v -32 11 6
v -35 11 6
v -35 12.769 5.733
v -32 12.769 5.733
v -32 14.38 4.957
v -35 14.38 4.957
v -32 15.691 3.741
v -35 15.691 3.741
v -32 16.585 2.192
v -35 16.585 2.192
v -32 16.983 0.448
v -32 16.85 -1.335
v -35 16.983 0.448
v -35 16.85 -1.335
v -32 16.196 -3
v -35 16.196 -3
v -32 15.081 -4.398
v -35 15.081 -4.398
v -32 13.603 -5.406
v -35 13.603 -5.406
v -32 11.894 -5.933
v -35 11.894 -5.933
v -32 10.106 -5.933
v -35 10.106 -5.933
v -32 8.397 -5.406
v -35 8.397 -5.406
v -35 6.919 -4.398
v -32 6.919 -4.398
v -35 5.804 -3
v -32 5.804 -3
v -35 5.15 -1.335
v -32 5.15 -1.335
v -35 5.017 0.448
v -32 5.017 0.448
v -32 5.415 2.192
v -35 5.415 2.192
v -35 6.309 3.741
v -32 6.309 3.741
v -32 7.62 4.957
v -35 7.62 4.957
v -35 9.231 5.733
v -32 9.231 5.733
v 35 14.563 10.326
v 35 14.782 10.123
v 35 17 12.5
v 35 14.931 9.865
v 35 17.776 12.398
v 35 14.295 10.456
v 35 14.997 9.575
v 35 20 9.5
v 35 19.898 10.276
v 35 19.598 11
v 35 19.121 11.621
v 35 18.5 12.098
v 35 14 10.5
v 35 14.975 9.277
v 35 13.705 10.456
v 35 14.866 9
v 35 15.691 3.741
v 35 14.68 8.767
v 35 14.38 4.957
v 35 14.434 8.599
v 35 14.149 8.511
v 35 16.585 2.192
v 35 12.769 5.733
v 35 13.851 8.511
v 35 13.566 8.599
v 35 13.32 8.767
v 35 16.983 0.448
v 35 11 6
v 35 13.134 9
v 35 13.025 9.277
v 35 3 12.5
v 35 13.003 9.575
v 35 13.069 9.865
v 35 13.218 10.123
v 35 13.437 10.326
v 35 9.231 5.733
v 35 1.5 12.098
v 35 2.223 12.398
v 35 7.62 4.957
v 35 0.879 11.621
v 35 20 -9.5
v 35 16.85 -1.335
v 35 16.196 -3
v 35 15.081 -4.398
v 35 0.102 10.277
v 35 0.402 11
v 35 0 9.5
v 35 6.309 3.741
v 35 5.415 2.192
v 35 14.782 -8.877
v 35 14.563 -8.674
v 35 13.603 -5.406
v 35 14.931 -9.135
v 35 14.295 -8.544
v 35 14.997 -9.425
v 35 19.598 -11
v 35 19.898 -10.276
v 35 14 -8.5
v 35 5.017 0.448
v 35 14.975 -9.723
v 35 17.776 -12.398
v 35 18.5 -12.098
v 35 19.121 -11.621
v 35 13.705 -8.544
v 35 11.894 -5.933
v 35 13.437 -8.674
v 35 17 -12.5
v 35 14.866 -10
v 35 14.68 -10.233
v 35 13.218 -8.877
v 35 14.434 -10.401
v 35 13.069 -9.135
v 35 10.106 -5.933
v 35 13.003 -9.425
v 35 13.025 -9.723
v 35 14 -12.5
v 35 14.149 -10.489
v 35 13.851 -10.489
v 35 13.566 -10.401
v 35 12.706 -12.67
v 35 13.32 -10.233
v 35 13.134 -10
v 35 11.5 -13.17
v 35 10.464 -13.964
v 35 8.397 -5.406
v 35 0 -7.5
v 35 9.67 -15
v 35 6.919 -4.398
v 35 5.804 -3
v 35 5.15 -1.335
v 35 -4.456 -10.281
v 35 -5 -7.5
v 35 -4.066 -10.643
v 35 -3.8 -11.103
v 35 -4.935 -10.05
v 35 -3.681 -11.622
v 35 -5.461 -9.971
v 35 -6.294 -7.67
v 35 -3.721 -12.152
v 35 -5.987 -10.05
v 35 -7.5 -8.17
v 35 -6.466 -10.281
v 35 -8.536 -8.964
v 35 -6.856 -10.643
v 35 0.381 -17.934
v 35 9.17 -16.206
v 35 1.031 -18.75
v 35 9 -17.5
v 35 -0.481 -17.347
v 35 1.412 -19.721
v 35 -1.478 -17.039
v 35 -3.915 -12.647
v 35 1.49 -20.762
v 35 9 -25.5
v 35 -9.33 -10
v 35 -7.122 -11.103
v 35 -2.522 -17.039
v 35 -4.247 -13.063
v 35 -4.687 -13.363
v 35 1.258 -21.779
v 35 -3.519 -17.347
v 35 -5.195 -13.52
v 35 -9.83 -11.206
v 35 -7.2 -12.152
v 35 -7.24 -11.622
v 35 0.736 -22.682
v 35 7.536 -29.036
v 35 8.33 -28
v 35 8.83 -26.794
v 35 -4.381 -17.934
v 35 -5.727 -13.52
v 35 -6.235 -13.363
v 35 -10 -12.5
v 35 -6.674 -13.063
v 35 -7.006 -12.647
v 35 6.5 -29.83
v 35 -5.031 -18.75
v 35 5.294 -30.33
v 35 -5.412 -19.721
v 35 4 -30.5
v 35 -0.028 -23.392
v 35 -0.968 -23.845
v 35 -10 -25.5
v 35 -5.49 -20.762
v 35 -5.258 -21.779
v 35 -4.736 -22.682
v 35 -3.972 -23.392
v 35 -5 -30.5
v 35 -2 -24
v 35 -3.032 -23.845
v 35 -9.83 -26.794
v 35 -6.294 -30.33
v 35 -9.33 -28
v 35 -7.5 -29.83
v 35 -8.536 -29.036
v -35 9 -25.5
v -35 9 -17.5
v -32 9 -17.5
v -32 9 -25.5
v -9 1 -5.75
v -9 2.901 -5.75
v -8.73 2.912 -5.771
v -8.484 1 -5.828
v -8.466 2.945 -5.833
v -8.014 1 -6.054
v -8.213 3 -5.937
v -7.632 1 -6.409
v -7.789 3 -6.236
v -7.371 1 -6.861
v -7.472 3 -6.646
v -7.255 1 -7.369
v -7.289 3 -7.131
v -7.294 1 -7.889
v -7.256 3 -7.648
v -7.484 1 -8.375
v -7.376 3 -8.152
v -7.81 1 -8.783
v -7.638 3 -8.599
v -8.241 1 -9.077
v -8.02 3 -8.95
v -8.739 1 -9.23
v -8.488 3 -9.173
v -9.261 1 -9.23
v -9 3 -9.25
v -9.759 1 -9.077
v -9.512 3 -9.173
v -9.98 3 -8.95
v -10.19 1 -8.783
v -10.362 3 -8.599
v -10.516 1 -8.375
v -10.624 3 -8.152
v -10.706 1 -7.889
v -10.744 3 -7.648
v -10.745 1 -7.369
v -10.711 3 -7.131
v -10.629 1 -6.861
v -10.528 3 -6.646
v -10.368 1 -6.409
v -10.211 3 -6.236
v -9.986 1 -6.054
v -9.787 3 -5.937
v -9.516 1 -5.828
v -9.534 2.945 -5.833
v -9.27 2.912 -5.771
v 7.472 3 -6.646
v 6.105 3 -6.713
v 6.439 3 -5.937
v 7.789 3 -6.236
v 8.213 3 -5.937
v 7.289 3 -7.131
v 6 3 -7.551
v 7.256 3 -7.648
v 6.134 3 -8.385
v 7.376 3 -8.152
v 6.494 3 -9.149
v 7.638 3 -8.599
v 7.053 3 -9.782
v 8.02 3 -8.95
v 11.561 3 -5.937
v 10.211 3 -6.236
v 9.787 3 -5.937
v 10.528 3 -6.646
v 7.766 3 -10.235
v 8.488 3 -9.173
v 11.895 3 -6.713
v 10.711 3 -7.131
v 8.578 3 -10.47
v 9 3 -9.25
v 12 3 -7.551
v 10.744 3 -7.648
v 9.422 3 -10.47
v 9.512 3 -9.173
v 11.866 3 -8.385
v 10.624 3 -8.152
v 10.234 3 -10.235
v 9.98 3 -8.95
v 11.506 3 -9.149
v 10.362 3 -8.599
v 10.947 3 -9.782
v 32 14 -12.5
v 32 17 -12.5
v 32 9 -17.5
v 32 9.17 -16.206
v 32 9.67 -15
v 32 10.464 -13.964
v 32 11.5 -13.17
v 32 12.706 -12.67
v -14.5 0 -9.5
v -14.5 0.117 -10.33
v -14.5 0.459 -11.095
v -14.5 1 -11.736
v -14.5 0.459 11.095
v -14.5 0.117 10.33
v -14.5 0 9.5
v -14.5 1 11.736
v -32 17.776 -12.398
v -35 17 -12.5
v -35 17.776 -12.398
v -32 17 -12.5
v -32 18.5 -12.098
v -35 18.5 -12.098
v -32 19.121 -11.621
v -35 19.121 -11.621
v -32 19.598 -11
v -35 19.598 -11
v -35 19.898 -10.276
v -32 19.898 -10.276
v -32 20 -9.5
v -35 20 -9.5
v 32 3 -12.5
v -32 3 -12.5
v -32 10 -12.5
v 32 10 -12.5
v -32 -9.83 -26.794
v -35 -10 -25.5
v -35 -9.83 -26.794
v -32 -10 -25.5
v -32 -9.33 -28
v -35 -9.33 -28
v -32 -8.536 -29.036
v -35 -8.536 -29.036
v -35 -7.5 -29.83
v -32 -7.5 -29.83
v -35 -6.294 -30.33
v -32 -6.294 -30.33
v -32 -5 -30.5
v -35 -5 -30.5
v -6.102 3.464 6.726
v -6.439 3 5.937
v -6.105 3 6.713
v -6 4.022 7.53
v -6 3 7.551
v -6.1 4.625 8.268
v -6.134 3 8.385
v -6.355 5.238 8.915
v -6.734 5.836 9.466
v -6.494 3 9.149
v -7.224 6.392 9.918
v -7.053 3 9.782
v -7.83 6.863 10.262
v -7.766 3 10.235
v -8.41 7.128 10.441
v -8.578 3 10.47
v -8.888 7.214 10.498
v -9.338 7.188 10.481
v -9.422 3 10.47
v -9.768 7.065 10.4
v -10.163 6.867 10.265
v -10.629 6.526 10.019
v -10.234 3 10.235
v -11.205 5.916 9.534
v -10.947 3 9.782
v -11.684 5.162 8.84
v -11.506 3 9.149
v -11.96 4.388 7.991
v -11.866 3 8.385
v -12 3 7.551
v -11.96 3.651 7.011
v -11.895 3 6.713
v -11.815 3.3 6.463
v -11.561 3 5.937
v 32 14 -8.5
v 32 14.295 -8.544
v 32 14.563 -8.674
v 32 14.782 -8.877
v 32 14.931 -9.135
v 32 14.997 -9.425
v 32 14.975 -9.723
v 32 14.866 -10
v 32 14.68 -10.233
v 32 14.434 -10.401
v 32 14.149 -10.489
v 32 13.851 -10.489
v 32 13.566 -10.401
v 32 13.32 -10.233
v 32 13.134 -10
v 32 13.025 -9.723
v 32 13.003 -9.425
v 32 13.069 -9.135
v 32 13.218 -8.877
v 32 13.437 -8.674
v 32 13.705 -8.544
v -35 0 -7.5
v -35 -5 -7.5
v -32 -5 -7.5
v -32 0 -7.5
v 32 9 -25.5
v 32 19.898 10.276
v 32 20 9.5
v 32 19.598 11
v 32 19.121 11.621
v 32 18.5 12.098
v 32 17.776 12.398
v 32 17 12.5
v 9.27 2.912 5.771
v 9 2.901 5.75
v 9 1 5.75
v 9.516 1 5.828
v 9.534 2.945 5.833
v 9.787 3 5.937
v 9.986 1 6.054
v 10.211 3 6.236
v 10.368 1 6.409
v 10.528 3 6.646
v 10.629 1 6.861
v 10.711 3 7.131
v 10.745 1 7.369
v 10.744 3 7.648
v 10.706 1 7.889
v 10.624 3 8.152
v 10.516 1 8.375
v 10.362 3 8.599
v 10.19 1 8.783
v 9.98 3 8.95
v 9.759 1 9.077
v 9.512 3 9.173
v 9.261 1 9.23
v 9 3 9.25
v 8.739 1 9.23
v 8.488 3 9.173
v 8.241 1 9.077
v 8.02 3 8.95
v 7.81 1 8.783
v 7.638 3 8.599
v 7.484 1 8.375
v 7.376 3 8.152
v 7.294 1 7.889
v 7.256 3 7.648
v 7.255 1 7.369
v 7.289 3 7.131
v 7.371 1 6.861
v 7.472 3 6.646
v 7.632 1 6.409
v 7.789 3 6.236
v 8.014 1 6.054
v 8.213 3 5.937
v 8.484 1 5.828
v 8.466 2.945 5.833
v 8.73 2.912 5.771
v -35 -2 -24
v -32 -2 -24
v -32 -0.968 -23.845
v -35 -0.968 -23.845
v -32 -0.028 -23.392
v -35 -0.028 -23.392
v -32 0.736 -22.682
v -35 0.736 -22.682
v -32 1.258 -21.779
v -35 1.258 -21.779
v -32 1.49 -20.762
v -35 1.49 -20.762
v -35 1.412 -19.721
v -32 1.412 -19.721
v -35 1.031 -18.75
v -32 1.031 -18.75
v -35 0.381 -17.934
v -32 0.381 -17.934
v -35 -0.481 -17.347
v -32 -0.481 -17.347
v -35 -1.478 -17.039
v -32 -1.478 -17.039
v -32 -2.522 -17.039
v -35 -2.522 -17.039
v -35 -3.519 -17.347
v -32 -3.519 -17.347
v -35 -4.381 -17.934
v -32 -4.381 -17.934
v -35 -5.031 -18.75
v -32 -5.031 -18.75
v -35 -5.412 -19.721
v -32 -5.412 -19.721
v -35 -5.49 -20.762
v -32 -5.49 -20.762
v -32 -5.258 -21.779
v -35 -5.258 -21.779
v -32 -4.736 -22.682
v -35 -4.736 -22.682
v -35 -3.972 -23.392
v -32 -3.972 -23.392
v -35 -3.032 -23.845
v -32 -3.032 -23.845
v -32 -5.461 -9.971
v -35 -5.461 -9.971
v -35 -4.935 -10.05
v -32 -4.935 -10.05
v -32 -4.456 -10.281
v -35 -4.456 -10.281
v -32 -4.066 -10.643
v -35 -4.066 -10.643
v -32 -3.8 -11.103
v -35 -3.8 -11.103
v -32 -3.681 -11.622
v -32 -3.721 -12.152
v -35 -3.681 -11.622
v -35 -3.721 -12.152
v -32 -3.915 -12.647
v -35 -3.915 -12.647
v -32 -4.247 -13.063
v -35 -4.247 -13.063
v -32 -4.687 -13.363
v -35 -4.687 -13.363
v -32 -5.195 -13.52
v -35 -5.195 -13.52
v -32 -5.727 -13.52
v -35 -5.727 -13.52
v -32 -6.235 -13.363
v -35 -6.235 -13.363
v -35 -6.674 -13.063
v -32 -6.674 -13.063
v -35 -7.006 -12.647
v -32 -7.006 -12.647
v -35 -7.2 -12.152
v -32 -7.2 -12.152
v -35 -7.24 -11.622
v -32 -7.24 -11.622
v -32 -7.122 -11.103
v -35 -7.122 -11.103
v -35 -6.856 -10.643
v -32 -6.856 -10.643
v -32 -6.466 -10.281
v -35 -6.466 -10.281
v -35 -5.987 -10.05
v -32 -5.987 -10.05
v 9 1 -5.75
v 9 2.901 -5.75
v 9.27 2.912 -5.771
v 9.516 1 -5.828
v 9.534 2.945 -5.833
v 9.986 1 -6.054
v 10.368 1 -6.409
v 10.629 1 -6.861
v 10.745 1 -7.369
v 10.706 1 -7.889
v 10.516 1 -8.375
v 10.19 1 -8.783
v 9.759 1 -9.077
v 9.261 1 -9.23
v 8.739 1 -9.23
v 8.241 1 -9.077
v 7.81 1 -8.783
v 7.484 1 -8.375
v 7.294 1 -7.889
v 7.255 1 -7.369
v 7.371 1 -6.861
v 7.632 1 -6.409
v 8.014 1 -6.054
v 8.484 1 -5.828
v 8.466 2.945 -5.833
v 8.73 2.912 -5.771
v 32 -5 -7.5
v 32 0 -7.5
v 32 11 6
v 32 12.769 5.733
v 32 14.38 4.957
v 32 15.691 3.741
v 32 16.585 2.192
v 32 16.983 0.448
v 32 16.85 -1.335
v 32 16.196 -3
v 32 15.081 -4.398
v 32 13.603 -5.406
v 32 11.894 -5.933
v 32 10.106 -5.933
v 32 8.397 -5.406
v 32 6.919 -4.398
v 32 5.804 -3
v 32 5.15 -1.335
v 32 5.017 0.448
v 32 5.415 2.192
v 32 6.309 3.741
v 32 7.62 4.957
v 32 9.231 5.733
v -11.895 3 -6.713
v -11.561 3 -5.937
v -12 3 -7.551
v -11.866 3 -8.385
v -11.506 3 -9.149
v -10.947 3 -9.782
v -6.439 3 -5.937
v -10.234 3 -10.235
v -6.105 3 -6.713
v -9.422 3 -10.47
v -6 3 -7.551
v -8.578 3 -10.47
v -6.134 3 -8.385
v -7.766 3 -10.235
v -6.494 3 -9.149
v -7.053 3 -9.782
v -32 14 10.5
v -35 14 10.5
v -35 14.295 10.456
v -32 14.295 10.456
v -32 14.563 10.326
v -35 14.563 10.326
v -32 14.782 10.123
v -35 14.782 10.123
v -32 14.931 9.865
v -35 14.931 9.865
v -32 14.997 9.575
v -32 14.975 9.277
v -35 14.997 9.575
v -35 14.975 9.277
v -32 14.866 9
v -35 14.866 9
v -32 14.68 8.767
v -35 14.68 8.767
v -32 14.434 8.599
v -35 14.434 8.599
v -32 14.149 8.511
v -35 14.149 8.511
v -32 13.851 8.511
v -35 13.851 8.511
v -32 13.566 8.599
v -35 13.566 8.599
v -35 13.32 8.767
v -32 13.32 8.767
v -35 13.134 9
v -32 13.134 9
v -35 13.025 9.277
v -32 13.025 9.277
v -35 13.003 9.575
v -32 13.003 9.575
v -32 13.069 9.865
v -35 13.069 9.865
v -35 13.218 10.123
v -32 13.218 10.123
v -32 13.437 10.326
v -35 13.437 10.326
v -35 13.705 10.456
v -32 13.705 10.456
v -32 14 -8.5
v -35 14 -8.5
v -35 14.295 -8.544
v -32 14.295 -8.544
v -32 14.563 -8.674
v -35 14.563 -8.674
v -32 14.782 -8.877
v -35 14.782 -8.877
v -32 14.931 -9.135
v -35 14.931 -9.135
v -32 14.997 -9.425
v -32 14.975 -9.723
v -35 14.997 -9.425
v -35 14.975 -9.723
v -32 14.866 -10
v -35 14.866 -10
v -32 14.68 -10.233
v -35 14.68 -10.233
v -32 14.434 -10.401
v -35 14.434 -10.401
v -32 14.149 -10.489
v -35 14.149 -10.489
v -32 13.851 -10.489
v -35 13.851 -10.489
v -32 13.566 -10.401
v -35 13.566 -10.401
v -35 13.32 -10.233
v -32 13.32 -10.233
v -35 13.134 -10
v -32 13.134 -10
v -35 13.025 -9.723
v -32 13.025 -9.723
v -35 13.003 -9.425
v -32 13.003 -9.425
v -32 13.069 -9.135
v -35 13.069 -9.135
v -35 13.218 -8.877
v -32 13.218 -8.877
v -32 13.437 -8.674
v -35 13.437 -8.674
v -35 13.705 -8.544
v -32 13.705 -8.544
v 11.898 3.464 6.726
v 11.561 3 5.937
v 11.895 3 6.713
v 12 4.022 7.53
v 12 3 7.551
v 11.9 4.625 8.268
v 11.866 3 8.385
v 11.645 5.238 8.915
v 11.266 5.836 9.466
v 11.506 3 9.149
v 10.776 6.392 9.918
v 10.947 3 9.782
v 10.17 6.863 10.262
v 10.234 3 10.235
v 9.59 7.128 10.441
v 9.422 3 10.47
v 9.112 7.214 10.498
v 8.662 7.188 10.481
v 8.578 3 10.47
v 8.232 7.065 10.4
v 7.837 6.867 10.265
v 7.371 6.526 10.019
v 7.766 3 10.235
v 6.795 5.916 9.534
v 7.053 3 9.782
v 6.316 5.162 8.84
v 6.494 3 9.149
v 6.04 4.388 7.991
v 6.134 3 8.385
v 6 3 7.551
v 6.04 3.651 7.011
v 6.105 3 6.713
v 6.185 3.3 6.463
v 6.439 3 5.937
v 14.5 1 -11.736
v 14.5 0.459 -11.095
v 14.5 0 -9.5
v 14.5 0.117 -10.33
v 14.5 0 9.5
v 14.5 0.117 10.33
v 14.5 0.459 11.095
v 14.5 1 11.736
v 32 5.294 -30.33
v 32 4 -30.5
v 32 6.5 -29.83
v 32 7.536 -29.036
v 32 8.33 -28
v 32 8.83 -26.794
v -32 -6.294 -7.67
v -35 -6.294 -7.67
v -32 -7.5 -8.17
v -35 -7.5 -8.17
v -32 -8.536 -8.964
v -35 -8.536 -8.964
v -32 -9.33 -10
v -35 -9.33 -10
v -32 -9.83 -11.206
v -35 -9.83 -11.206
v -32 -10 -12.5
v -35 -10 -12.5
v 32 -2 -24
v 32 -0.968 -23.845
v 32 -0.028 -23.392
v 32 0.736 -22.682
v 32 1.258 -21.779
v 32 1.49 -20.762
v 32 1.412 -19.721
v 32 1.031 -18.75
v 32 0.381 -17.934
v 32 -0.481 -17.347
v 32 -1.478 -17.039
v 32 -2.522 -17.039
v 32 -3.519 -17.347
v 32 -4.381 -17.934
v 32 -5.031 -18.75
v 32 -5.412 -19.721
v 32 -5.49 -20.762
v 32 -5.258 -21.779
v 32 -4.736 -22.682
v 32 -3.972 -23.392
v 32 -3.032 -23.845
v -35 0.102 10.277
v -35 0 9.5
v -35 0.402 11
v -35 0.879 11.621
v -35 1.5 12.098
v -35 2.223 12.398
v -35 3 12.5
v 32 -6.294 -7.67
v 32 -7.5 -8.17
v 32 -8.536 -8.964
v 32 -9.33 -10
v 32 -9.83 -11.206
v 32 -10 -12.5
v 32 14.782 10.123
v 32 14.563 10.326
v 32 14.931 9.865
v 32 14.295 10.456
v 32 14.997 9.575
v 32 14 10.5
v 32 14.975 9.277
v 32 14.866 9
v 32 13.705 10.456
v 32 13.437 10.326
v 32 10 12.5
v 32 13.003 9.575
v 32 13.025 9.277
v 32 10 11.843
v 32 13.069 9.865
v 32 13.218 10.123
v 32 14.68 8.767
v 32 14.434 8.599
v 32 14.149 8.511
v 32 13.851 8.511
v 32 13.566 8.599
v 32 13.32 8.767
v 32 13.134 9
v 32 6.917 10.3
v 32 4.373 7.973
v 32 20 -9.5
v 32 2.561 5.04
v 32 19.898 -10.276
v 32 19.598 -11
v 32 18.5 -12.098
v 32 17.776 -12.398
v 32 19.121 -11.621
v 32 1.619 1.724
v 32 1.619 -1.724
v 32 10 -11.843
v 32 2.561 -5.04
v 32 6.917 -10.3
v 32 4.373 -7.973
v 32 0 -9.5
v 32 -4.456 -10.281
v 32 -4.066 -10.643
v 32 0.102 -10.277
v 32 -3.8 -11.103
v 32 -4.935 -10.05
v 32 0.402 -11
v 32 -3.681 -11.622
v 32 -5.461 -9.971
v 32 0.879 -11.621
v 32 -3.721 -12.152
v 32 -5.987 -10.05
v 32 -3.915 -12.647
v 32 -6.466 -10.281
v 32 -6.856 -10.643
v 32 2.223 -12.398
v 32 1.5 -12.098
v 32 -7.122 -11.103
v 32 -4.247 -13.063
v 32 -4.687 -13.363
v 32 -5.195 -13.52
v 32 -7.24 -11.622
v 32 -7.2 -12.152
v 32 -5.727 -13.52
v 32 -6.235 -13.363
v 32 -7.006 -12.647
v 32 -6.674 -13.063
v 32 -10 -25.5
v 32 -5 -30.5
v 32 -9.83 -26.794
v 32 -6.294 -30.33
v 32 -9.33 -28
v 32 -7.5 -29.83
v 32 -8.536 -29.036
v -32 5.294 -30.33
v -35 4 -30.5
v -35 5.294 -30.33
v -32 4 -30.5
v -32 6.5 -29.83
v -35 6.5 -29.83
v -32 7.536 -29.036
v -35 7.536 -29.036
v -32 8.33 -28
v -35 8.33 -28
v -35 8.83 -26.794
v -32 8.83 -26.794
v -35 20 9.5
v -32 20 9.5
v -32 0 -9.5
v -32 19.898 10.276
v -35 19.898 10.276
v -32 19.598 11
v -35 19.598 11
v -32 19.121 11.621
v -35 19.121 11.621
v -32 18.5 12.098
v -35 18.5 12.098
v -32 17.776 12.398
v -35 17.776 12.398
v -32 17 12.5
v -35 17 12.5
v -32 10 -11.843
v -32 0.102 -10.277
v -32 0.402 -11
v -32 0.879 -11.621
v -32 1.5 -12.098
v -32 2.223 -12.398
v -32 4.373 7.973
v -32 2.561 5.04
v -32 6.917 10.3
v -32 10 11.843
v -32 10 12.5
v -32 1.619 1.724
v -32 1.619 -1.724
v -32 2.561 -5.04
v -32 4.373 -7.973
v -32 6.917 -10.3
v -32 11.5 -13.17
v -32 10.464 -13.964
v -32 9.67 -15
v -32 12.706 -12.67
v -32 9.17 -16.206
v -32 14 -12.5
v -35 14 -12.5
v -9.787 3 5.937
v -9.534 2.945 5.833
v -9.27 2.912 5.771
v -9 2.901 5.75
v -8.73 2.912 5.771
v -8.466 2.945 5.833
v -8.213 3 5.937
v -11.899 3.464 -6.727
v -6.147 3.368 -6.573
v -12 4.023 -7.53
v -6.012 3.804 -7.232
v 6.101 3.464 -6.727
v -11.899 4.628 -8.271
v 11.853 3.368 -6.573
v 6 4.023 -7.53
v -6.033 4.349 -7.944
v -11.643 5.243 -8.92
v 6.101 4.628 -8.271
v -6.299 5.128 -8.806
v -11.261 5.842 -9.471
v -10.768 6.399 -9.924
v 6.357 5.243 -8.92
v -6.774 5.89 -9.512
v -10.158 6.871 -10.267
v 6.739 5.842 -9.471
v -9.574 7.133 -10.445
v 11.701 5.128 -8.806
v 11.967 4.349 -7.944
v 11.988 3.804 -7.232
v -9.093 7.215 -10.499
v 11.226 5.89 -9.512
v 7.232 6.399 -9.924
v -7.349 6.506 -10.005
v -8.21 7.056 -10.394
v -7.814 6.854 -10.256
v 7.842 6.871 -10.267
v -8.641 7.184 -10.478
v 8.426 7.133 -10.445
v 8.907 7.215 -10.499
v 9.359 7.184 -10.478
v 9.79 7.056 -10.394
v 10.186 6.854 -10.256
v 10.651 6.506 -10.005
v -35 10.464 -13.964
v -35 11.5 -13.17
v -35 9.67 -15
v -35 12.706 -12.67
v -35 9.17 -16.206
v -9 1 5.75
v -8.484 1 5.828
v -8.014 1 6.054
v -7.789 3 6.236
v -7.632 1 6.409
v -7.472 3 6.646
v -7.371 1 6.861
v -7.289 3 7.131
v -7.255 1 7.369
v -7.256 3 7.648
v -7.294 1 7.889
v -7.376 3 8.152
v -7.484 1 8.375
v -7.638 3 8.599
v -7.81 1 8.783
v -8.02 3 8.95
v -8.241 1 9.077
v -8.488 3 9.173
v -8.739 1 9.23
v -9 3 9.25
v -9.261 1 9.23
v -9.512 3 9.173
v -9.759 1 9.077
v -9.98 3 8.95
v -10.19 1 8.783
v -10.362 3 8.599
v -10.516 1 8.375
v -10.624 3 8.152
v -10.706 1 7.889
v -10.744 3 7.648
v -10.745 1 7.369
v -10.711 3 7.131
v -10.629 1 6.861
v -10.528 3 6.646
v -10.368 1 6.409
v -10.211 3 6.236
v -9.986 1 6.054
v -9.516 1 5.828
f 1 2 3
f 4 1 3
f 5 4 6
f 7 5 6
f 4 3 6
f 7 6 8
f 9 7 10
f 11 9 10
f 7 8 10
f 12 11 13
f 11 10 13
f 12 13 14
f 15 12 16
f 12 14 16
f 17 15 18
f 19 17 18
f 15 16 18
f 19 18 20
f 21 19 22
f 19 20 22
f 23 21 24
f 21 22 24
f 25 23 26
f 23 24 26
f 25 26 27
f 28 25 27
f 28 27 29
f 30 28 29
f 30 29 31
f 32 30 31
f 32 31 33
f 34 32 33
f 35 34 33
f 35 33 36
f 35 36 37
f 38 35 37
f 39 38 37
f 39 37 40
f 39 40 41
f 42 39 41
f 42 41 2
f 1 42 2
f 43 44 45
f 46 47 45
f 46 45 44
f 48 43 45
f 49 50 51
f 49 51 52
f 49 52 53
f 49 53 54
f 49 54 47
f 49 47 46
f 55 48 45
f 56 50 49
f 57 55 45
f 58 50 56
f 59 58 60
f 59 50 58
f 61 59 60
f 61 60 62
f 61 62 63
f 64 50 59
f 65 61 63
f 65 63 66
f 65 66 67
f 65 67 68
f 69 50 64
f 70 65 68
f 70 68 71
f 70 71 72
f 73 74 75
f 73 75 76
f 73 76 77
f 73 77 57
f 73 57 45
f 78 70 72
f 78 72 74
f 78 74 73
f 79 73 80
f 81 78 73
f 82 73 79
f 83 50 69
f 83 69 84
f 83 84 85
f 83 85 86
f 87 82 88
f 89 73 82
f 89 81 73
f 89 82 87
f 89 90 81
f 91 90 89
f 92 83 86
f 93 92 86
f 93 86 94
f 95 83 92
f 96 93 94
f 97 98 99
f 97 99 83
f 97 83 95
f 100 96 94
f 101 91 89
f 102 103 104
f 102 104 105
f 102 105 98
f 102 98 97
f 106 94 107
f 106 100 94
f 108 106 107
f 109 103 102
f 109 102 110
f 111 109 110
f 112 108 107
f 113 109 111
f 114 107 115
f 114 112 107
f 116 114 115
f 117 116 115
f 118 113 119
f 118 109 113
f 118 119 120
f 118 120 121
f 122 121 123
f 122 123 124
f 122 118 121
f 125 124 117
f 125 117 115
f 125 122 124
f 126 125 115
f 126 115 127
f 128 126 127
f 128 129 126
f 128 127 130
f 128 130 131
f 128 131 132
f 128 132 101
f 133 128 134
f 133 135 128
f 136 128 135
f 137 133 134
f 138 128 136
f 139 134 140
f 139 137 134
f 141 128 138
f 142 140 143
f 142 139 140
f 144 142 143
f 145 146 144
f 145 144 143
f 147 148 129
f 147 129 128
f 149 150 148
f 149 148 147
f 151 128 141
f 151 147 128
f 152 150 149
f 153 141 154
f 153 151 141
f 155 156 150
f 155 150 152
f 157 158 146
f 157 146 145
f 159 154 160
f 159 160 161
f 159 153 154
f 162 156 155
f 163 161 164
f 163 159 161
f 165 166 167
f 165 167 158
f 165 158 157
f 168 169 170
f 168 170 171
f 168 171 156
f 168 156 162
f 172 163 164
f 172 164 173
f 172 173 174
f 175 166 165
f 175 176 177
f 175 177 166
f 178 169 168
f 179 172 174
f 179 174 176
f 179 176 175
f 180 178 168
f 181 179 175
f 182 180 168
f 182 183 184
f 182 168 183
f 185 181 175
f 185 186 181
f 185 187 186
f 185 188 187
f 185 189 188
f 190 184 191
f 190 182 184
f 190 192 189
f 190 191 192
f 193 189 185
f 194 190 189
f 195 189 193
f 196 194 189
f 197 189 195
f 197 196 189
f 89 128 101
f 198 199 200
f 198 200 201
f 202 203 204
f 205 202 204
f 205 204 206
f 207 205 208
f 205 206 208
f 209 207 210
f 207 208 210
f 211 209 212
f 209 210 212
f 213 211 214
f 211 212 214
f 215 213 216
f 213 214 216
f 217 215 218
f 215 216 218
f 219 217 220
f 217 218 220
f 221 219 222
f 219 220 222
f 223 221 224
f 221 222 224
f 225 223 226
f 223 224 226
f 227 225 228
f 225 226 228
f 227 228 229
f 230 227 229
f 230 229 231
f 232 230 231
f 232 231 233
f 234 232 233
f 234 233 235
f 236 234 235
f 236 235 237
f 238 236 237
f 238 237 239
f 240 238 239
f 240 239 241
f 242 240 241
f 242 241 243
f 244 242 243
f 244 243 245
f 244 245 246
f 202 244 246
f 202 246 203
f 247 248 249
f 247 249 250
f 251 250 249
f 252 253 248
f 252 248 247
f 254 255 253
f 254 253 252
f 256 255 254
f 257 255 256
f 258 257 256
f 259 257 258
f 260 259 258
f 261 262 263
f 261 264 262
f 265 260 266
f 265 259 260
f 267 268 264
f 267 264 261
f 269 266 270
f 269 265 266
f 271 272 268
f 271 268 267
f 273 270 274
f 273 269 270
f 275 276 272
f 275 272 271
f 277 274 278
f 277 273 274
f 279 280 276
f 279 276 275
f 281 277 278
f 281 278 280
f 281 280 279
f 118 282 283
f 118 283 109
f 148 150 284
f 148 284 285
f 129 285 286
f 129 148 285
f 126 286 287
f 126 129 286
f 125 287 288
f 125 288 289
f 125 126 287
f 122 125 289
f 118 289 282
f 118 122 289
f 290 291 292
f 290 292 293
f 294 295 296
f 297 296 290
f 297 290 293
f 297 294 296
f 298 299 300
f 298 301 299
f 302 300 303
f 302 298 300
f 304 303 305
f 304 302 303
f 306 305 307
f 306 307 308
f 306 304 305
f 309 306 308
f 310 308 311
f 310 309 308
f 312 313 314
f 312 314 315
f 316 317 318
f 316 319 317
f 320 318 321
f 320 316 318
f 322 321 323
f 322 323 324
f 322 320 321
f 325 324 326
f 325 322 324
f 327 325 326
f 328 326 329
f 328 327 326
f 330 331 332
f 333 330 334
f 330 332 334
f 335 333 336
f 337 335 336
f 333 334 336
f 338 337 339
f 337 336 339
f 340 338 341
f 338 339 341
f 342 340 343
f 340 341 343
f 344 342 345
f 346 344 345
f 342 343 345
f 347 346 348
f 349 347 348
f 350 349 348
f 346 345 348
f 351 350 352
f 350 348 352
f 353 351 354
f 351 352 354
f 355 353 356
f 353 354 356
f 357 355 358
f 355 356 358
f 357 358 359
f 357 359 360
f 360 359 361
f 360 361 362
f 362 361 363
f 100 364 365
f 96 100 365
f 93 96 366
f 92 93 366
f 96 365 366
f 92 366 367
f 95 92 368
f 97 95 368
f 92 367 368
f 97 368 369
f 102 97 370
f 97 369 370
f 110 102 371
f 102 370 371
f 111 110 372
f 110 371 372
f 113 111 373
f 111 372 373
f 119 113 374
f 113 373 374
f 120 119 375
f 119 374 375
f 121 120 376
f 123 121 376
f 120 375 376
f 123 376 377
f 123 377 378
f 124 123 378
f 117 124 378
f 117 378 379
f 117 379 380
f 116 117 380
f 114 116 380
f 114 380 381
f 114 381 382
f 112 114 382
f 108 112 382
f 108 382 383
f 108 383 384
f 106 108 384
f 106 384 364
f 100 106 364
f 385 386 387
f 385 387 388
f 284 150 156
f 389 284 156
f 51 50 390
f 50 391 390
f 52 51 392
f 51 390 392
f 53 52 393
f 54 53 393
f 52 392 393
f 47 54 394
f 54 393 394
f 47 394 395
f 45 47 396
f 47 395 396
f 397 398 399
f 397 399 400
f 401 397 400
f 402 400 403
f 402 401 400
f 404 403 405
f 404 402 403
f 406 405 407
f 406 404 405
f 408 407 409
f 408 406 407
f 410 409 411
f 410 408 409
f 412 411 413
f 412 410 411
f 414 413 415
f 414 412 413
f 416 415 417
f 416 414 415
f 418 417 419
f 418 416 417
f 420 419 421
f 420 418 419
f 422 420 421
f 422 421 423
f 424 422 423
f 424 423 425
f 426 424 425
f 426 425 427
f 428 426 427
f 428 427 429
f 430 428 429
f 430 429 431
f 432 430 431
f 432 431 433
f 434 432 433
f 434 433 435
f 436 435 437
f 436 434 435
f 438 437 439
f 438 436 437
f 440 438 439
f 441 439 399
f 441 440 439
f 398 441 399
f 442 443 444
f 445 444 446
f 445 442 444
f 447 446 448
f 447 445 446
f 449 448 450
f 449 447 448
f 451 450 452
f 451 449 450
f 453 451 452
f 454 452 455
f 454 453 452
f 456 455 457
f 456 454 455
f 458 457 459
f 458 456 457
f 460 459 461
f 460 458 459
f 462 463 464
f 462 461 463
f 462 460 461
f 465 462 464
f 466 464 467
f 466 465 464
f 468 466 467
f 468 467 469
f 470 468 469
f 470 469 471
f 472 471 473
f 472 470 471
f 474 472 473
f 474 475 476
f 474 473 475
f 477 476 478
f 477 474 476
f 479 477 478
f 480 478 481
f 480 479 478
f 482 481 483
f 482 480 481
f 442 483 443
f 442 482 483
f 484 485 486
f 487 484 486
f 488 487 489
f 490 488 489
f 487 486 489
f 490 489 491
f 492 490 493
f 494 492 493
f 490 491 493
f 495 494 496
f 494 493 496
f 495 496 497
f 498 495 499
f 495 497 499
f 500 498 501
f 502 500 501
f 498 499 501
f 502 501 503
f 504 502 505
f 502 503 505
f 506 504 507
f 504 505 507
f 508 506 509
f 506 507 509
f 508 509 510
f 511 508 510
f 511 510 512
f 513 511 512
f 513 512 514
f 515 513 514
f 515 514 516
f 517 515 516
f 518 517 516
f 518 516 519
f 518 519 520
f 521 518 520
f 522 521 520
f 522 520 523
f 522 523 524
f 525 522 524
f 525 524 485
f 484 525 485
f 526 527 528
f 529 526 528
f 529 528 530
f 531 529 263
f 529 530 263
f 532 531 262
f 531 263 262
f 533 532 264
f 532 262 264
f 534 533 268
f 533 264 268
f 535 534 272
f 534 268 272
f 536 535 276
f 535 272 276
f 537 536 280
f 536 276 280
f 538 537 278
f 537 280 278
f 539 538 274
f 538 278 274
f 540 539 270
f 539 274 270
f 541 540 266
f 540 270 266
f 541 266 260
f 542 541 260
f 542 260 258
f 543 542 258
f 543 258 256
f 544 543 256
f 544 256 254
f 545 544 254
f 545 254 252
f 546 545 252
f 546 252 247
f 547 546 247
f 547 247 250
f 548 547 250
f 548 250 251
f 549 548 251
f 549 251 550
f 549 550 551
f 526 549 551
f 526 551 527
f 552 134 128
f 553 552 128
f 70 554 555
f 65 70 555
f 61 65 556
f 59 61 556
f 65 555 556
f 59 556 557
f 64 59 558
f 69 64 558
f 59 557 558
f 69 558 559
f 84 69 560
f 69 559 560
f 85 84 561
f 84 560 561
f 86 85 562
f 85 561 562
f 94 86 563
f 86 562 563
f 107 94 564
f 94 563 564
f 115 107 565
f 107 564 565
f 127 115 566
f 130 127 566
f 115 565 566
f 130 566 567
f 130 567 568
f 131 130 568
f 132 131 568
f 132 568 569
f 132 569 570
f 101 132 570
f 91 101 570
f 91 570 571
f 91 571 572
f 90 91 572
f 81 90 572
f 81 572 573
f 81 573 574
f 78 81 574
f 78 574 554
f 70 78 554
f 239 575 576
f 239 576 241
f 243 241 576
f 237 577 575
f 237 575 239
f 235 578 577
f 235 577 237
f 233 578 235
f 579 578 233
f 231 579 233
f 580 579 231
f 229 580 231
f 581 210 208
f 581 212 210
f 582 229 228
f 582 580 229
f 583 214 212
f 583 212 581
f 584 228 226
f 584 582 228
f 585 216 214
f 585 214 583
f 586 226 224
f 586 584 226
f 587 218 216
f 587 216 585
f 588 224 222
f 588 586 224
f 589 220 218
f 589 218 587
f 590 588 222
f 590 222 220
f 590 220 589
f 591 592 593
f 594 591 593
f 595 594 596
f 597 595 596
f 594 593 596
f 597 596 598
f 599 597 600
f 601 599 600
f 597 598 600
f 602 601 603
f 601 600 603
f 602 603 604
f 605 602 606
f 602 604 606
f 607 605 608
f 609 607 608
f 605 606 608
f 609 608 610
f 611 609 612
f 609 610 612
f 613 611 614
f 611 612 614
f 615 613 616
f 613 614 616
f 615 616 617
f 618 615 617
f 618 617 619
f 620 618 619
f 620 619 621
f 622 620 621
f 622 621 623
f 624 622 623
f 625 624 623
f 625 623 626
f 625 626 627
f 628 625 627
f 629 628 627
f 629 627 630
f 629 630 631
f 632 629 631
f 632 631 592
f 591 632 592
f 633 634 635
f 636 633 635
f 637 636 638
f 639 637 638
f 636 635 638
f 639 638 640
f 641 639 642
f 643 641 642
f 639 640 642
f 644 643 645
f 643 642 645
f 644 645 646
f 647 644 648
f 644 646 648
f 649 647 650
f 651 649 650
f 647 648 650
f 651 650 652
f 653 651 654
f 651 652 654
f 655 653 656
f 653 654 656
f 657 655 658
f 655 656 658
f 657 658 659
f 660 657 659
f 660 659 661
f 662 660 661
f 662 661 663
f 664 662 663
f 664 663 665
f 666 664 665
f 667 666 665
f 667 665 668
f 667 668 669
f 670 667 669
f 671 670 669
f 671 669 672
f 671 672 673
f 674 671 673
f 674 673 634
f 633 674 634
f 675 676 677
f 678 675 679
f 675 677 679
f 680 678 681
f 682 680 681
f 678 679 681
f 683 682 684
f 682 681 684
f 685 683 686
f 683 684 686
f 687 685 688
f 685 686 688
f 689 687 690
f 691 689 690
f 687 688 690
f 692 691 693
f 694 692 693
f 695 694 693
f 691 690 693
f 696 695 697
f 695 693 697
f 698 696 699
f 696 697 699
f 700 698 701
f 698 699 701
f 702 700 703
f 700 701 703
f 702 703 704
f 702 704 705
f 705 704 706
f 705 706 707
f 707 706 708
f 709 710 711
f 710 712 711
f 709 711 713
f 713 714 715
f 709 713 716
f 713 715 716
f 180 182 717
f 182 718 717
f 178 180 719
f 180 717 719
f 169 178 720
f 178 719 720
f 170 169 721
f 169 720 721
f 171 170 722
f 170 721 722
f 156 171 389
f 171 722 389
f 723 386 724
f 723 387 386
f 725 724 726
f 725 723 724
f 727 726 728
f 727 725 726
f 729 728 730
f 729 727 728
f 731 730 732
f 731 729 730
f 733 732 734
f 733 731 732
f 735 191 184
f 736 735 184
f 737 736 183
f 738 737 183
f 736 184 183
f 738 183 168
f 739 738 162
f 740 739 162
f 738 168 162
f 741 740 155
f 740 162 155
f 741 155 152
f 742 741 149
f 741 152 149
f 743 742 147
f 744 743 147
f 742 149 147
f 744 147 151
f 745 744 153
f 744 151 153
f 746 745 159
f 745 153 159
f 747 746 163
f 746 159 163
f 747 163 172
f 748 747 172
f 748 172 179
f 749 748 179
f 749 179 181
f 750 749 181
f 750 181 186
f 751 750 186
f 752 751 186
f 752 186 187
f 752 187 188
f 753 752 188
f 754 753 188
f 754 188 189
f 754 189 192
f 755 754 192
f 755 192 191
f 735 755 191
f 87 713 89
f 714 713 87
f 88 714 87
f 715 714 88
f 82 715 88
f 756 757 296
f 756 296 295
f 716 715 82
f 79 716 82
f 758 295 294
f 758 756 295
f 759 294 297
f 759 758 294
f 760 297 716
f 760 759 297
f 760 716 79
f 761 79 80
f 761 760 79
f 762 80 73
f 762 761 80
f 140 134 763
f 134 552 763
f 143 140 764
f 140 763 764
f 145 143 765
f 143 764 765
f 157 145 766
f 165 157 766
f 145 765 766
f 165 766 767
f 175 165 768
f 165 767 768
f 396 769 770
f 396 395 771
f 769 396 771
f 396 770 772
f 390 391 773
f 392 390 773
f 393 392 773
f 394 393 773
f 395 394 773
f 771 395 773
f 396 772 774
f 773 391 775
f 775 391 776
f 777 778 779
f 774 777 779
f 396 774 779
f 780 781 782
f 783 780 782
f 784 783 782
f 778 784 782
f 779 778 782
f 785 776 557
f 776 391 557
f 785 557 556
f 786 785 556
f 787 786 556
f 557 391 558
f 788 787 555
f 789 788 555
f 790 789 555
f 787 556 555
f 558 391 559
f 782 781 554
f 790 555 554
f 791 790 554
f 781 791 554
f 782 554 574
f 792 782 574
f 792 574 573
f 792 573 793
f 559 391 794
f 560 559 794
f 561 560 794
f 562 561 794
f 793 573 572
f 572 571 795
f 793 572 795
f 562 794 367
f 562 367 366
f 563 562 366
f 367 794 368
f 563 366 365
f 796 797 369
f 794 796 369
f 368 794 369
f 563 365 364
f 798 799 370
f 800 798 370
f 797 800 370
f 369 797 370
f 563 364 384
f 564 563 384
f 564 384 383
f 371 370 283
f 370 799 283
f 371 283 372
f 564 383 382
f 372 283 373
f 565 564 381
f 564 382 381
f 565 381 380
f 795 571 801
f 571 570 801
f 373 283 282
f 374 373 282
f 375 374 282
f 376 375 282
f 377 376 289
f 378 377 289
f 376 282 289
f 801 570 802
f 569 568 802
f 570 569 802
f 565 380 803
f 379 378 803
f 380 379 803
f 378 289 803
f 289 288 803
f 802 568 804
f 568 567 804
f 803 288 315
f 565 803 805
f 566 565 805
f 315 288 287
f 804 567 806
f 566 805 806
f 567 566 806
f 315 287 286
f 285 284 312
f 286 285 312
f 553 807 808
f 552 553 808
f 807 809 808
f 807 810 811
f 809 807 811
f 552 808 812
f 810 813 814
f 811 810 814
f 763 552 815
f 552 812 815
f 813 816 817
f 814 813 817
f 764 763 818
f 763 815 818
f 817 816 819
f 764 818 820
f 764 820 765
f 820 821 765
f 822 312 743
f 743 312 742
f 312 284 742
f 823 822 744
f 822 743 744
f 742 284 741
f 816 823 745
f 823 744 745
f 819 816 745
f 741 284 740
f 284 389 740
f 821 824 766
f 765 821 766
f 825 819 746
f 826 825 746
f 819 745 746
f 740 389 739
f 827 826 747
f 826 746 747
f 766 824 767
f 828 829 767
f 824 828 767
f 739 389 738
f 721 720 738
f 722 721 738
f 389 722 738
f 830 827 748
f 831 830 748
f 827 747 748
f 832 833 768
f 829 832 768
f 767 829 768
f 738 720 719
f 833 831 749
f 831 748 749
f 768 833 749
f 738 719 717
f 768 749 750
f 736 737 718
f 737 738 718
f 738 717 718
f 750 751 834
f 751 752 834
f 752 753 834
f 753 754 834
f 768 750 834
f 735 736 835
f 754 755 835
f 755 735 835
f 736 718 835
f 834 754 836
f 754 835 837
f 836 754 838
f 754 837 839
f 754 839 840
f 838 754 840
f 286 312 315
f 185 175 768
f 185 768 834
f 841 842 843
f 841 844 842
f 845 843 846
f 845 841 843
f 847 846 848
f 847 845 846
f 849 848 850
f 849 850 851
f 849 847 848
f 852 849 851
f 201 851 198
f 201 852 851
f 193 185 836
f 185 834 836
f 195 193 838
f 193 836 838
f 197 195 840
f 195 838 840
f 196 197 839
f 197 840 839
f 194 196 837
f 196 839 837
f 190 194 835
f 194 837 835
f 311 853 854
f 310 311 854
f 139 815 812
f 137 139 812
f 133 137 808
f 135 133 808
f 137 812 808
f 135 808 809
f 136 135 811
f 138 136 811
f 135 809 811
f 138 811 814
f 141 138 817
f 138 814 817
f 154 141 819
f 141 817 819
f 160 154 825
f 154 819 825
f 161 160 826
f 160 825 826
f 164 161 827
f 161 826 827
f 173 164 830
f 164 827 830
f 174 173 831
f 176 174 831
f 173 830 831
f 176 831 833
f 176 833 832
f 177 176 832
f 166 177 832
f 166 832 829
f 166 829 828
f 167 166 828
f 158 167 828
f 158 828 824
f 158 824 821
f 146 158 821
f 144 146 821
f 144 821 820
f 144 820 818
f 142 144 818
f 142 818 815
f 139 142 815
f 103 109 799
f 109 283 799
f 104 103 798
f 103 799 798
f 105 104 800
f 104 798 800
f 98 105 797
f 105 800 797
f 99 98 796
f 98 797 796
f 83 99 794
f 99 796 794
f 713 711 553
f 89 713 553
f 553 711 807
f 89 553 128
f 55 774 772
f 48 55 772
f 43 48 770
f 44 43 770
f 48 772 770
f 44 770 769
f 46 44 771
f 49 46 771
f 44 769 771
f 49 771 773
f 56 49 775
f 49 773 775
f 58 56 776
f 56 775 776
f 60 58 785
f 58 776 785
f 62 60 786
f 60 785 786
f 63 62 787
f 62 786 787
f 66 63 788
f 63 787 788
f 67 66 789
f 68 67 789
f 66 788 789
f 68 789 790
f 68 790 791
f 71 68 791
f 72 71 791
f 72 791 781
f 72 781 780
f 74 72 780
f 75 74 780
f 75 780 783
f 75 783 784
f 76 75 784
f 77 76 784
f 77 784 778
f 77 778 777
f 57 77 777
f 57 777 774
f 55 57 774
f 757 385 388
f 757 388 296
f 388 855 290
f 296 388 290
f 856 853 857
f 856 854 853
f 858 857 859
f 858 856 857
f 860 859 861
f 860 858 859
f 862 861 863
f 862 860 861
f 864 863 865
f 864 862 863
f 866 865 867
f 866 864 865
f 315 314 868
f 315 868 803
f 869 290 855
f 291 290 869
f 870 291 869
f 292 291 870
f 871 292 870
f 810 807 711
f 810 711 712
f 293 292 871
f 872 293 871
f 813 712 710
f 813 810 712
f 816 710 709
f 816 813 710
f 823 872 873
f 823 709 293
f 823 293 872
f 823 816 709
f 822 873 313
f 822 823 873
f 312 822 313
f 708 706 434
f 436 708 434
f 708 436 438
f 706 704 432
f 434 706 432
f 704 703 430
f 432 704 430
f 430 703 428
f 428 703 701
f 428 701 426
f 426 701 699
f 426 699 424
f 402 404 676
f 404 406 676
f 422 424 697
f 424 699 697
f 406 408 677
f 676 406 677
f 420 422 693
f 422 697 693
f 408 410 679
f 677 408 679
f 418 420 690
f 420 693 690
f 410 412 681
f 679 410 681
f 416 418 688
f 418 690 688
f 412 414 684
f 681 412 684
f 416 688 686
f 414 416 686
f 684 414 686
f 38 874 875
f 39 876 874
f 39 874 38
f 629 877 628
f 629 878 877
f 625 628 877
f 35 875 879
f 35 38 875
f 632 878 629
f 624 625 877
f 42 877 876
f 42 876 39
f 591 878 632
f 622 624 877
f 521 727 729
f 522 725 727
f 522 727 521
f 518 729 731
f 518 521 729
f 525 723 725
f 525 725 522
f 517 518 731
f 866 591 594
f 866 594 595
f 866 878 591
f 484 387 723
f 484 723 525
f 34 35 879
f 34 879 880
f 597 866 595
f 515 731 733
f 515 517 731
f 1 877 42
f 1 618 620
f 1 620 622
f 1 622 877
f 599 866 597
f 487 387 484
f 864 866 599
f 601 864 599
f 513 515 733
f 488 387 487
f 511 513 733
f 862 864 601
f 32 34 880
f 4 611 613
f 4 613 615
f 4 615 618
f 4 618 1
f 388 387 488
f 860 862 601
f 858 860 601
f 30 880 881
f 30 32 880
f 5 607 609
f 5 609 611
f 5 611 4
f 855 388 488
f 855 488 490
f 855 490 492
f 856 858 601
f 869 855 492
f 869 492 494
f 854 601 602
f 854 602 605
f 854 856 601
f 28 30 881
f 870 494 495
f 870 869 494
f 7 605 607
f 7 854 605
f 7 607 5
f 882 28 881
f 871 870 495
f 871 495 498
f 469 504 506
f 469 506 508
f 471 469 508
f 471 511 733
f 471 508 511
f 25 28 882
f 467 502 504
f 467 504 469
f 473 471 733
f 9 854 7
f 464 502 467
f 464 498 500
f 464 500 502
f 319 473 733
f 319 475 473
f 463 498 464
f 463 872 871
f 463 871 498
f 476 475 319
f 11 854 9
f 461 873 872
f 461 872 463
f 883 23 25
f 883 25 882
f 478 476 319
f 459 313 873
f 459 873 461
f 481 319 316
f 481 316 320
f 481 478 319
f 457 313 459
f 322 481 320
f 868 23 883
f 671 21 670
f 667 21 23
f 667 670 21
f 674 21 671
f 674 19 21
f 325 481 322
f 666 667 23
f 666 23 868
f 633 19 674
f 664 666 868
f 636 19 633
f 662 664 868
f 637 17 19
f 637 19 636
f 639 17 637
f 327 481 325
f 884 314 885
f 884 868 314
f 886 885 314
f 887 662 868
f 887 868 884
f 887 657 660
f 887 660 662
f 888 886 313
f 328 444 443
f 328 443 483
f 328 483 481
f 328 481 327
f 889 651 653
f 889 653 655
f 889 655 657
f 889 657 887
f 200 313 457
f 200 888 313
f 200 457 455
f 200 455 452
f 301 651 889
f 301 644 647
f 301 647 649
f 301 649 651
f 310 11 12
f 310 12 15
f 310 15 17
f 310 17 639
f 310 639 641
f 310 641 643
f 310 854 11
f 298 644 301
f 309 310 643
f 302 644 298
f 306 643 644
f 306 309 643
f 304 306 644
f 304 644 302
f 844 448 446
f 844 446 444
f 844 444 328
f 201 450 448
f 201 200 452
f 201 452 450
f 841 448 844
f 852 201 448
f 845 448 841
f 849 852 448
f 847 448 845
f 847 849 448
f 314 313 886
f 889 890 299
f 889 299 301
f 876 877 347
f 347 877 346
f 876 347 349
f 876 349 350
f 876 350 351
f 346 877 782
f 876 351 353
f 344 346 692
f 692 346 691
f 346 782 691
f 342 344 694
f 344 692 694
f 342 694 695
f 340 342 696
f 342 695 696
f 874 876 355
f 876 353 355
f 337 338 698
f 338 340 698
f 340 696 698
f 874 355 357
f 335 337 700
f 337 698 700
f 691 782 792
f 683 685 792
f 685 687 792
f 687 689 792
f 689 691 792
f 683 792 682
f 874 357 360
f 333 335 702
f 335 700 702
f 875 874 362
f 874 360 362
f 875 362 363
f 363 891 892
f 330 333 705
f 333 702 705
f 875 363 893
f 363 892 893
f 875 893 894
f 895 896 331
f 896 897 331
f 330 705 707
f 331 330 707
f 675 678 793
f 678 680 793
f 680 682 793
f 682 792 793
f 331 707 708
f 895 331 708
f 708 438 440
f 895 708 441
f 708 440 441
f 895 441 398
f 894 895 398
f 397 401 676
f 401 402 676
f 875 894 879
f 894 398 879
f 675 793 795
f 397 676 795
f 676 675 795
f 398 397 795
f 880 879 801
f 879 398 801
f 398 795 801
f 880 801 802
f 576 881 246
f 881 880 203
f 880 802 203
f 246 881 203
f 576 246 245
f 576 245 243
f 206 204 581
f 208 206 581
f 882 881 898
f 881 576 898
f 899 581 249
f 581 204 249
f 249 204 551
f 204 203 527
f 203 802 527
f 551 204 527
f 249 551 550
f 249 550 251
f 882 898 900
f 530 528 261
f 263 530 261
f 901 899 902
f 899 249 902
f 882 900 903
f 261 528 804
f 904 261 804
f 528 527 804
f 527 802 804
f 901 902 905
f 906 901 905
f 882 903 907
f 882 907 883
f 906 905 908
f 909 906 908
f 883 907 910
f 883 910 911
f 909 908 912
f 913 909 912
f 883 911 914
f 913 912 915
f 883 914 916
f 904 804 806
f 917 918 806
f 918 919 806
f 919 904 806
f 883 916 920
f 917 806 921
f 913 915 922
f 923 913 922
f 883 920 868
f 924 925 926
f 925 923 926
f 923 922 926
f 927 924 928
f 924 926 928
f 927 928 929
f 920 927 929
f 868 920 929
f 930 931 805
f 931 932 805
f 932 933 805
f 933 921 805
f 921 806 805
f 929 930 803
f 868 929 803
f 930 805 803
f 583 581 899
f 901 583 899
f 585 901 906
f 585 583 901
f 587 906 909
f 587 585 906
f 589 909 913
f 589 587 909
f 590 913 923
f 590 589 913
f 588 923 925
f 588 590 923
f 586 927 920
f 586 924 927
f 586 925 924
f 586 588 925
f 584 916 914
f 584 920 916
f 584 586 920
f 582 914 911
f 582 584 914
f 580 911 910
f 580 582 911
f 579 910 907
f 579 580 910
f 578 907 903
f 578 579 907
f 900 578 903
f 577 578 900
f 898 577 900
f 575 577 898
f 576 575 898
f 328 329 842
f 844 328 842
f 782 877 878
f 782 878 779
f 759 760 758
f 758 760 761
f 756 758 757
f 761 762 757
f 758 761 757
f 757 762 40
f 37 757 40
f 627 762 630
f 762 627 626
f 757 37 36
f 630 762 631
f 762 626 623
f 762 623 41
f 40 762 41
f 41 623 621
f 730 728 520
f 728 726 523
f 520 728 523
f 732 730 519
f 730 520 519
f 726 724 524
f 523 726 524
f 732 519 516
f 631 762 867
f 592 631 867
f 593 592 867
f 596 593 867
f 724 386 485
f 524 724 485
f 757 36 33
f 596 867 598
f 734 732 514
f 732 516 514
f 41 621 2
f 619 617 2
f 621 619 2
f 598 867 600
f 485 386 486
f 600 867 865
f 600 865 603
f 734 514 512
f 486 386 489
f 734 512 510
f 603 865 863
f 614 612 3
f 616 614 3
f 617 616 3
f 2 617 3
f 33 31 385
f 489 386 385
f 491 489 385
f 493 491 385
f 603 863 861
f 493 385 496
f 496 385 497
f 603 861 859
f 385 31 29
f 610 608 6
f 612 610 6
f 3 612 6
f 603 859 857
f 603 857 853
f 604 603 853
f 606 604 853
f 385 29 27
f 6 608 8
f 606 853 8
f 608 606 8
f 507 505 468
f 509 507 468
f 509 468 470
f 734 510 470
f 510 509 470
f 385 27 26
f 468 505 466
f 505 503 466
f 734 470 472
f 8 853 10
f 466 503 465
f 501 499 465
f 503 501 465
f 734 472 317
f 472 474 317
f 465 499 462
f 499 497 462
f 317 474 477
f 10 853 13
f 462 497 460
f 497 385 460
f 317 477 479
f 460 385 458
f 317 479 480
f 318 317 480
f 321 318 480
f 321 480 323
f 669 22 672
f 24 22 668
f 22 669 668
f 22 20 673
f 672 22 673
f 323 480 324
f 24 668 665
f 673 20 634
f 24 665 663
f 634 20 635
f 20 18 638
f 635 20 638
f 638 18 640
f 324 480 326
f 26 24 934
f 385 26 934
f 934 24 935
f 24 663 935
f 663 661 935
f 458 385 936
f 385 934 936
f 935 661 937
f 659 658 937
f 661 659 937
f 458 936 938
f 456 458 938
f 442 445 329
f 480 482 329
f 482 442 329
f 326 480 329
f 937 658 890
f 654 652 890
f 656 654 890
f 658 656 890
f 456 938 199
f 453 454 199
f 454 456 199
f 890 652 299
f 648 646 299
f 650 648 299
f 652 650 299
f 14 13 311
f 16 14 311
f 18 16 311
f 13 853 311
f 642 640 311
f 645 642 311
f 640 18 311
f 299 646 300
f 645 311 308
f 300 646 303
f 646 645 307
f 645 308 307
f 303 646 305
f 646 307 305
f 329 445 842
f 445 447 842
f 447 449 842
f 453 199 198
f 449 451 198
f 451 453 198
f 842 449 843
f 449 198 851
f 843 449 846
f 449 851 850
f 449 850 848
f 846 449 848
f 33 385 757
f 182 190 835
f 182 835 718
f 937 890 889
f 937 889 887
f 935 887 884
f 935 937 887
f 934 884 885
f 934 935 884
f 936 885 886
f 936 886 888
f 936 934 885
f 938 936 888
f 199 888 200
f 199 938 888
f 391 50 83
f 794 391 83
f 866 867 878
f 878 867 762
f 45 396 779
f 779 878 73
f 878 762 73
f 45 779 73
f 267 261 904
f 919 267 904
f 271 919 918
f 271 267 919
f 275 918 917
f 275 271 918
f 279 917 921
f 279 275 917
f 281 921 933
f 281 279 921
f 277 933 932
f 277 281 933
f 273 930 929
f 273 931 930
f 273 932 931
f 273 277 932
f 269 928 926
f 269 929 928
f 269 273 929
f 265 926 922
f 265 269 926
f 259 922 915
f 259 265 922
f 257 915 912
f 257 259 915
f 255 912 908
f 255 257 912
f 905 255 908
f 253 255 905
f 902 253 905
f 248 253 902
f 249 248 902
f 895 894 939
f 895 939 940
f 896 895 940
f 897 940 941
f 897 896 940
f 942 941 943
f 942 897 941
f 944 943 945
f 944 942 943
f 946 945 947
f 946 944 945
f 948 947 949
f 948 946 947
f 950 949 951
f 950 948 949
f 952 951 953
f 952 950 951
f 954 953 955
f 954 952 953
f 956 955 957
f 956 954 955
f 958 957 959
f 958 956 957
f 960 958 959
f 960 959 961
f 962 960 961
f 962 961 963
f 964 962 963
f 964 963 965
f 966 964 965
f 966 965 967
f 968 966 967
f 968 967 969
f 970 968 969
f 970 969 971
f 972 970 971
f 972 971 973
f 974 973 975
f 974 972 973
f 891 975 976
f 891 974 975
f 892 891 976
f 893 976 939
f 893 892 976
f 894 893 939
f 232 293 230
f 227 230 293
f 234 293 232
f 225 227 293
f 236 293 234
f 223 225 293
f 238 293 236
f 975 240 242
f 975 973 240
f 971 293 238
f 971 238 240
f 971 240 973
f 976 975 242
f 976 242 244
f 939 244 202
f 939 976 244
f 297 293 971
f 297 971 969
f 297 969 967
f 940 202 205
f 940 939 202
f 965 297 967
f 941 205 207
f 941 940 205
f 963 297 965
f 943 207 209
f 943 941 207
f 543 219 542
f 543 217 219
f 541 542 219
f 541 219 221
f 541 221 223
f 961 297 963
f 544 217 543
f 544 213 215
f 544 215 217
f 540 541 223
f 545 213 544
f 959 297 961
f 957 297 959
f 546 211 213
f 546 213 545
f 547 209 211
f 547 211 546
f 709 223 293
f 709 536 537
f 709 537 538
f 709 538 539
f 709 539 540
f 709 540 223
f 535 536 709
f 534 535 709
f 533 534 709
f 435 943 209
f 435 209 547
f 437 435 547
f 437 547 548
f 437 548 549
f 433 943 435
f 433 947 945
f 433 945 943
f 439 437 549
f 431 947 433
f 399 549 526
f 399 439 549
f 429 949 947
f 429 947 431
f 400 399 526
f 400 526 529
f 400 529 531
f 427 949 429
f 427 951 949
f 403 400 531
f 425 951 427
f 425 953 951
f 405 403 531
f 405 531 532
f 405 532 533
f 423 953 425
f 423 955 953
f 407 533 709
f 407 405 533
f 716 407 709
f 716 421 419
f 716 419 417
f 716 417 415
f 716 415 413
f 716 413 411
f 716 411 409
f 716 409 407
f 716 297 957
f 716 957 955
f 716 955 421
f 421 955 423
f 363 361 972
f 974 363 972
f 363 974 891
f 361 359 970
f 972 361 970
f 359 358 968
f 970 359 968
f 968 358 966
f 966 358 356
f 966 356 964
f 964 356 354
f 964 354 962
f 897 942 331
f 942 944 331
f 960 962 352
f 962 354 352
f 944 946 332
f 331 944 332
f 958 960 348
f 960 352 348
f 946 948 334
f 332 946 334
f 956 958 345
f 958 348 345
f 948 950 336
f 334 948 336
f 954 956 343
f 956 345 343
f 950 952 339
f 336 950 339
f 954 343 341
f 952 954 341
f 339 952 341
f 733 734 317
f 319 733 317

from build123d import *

# Parameters (mm, degrees)
SKETCH1_W            = 70
SKETCH1_H            = 25
BOSS_EXTRUDE1_DEPTH  = 10
SKETCH2_W            = 3
SKETCH2_H            = 25
BOSS_EXTRUDE2_DEPTH  = 10
SKETCH3_R            = 12.5
CUT_EXTRUDE1_DEPTH   = 67
SKETCH4_R            = 3
CUT_EXTRUDE2_DEPTH   = 41.868692174
SKETCH5_R            = 1.75
CUT_EXTRUDE3_DEPTH   = 41.868692259
SKETCH6_W            = 29
SKETCH6_H            = 13
CUT_EXTRUDE4_DEPTH   = 1
SKETCH9_W            = 25
SKETCH9_H            = 20
BOSS_EXTRUDE3_DEPTH  = 3
SKETCH8_R            = 6
SKETCH8_R_2          = 1
CUT_EXTRUDE6_DEPTH   = 74.866433513
FILLET1_R            = 3
SKETCH10_W           = 23
SKETCH10_H           = 19
BOSS_EXTRUDE4_DEPTH  = 3
FILLET2_R            = 5
SKETCH11_R           = 3.5
CUT_EXTRUDE7_DEPTH   = 79.931932702
FILLET2_OF_MIRROR2_R = 5
FILLET3_R            = 5
FILLET4_R            = 3
SKETCH12_R           = 1.784400781
CUT_EXTRUDE8_DEPTH   = 79.931932702


# Some blends are built 0.0001 mm under size
with BuildPart() as part:
    # Sketch1 → Boss-Extrude1 (new body)
    with BuildSketch(Plane(origin=(0, 0, 0), x_dir=(1, 0, 0), z_dir=(0, 1, 0))):
        Rectangle(SKETCH1_W, SKETCH1_H)
    extrude(amount=BOSS_EXTRUDE1_DEPTH)

    # Sketch2 → Boss-Extrude2 (add)
    with BuildSketch(Plane(origin=(0, 10, 0), x_dir=(1, 0, 0), z_dir=(0, 1, 0))):
        with Locations((-33.5, 0)):
            Rectangle(SKETCH2_W, SKETCH2_H)
    extrude(amount=BOSS_EXTRUDE2_DEPTH)

    # Sketch3 → Cut-Extrude1 (cut)
    with BuildSketch(Plane(origin=(35, 0, 0), x_dir=(0, 0, -1), z_dir=(1, 0, 0))):
        with Locations((0, 14)):
            Circle(SKETCH3_R)
    extrude(amount=-CUT_EXTRUDE1_DEPTH, mode=Mode.SUBTRACT)

    # Sketch4 → Cut-Extrude2 (cut, through all)
    with BuildSketch(Plane(origin=(0, 3, 0), x_dir=(1, 0, 0), z_dir=(0, 1, 0))):
        with Locations((-9, 7.5)):
            Circle(SKETCH4_R)
        with Locations((9, 7.5)):
            Circle(SKETCH4_R)
    cut_extrude2 = extrude(amount=CUT_EXTRUDE2_DEPTH, mode=Mode.SUBTRACT)

    # Sketch5 → Cut-Extrude3 (cut, through all)
    with BuildSketch(Plane(origin=(0, 3, 0), x_dir=(1, 0, 0), z_dir=(0, 1, 0))):
        with Locations(Location((-9, 7.5, 0), (0, 0, 270))):
            Circle(SKETCH5_R)
        with Locations(Location((9, 7.5, 0), (0, 0, 270))):
            Circle(SKETCH5_R)
    cut_extrude3 = extrude(amount=-CUT_EXTRUDE3_DEPTH, mode=Mode.SUBTRACT)

    # Sketch6 → Cut-Extrude4 (cut)
    with BuildSketch(Plane.XZ):
        with Locations((0, -6)):
            Rectangle(SKETCH6_W, SKETCH6_H)
    cut_extrude4 = extrude(amount=-CUT_EXTRUDE4_DEPTH, mode=Mode.SUBTRACT)

    # Mirror1: Cut-Extrude2, Cut-Extrude3, Cut-Extrude4 across plane
    add(cut_extrude2.mirror(Plane.XY), mode=Mode.SUBTRACT)
    add(cut_extrude3.mirror(Plane.XY), mode=Mode.SUBTRACT)
    add(cut_extrude4.mirror(Plane.XY), mode=Mode.SUBTRACT)

    # Sketch9 → Boss-Extrude3 (add)
    with BuildSketch(Plane(origin=(35, 0, 0), x_dir=(0, 0, -1), z_dir=(1, 0, 0))):
        with Locations((0, 10)):
            Rectangle(SKETCH9_W, SKETCH9_H)
    extrude(amount=-BOSS_EXTRUDE3_DEPTH)

    # Sketch8 → Cut-Extrude6 (cut, through all)
    with BuildSketch(Plane.ZY.offset(35)):
        with Locations((0, 11)):
            Circle(SKETCH8_R)
        with Locations((-9.5, 14)):
            Circle(SKETCH8_R_2)
        with Locations((9.5, 14)):
            Circle(SKETCH8_R_2)
    extrude(amount=-CUT_EXTRUDE6_DEPTH, mode=Mode.SUBTRACT)

    # Fillet1
    fillet1_edges = [part.edges().sort_by_distance(p)[0] for p in [
        (33.5, 20, 12.5),
        (33.5, 20, -12.5),
        (-33.5, 20, 12.5),
        (-33.5, 20, -12.5),
    ]]
    fillet(fillet1_edges, radius=FILLET1_R)

    # Sketch10 → Boss-Extrude4 (add)
    with BuildSketch(Plane(origin=(35, 0, 0), x_dir=(0, 0, -1), z_dir=(1, 0, 0))):
        with Locations((19, -0.5)):
            Rectangle(SKETCH10_W, SKETCH10_H)
    boss_extrude4 = extrude(amount=-BOSS_EXTRUDE4_DEPTH)

    # Fillet2
    fillet2_edges = [part.edges().sort_by_distance(p)[0] for p in [
        (33.5, -10, -7.5),
        (33.5, 9, -30.5),
        (33.5, -10, -30.5),
    ]]
    fillet(fillet2_edges, radius=FILLET2_R)

    # Sketch11 → Cut-Extrude7 (cut, through all)
    with BuildSketch(Plane(origin=(35, 0, 0), x_dir=(0, 0, -1), z_dir=(1, 0, 0))):
        with Locations((20.5, -2)):
            Circle(SKETCH11_R)
    cut_extrude7 = extrude(amount=-CUT_EXTRUDE7_DEPTH, mode=Mode.SUBTRACT)

    # Mirror2: Boss-Extrude4, Cut-Extrude7 across plane
    add(boss_extrude4.mirror(Plane(origin=(0, 0, 0), x_dir=(0, 0, 1), z_dir=(1, 0, 0))))
    add(cut_extrude7.mirror(Plane(origin=(0, 0, 0), x_dir=(0, 0, 1), z_dir=(1, 0, 0))), mode=Mode.SUBTRACT)

    # Fillet2 of Mirror2
    fillet2_of_mirror2_edges = [part.edges().sort_by_distance(p)[0] for p in [
        (-33.5, -10, -7.5),
        (-33.5, 9, -30.5),
        (-33.5, -10, -30.5),
    ]]
    fillet(fillet2_of_mirror2_edges, radius=FILLET2_OF_MIRROR2_R)

    # Fillet3
    # the kernel refuses this fillet: 5 mm, written as the material it adds along each edge
    with BuildSketch(Plane(origin=(35, 9, -12.5), x_dir=(0, 1, 0), z_dir=(-1, 0, 0)), Plane(origin=(-35, 9, -12.5), x_dir=(0, 0, -1), z_dir=(1, 0, 0))) as fillet3_piece_1:
        with BuildLine():
            CenterArc((FILLET3_R, FILLET3_R), FILLET3_R, 180, 90)
            Line((0, FILLET3_R), (0, 0))
            Line((0, 0), (FILLET3_R, 0))
        make_face()
    extrude(amount=3)

    # Fillet4
    fillet4_edges = [part.edges().sort_by_distance(p)[0] for p in [
        (24.75, 0, 12.5),
        (-23.25, 0, -12.5),
    ]]
    fillet(fillet4_edges, radius=FILLET4_R - 0.0001)  # a hair under: the kernel refuses the full size

    # Sketch12 → Cut-Extrude8 (cut, through all)
    with BuildSketch(Plane.ZY.offset(35)):
        with Locations((-11.755294266, -5.460778231)):
            Circle(SKETCH12_R)
    extrude(amount=-CUT_EXTRUDE8_DEPTH, mode=Mode.SUBTRACT)


solid = part.part
